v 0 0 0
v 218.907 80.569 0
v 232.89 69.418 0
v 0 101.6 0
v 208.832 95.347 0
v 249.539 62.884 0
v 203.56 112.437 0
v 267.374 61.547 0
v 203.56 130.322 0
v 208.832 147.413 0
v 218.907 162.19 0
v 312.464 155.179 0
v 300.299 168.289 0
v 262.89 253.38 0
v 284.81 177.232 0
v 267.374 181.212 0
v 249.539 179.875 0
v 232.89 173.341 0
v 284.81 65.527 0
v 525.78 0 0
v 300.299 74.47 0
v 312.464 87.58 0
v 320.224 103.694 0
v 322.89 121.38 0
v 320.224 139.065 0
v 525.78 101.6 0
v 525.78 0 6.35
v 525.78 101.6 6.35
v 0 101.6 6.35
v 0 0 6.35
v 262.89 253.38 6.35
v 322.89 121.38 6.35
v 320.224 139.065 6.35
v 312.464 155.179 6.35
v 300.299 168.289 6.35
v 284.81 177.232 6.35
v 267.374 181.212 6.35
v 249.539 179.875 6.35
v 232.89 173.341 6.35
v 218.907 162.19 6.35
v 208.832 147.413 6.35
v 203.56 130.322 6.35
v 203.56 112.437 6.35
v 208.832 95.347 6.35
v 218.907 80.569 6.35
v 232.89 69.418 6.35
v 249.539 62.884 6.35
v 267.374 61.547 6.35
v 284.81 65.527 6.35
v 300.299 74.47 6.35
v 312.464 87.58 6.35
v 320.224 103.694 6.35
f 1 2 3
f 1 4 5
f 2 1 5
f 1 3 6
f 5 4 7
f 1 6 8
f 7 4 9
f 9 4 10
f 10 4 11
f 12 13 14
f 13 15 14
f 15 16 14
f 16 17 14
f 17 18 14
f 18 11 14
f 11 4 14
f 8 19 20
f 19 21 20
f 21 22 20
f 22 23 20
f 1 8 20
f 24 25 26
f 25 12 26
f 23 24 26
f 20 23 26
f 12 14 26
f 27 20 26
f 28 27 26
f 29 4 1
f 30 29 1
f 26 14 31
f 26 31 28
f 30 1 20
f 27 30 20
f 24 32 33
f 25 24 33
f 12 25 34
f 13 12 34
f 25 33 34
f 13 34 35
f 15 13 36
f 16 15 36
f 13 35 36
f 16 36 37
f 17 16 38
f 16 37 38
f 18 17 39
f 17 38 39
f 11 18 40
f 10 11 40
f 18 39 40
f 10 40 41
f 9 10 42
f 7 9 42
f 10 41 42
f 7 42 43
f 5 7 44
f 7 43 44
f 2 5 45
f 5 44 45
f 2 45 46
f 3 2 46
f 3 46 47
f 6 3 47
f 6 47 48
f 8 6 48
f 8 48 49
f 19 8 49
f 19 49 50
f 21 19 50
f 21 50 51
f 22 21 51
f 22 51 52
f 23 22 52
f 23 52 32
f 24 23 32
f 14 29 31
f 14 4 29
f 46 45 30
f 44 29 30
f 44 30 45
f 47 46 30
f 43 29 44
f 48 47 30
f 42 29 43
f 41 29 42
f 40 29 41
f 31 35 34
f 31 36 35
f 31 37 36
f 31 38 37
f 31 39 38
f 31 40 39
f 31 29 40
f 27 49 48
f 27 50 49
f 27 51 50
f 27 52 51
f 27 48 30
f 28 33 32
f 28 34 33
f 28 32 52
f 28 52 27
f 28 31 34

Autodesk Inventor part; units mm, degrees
ref_plane "YZ Plane" through (0, 0, 0) normal (1, 0, 0) x (0, 1, 0)
ref_plane "XZ Plane" through (0, 0, 0) normal (0, 1, 0) x (-1, 0, 0)
ref_plane "XY Plane" through (0, 0, 0) normal (0, 0, 1) x (1, 0, 0)
sketch "Sketch1" plane through (0, 0, 0) normal (0, 0, 1) x (1, 0, 0)
  line L0 (0, 0) -> (525.78, 0)
  line L1 (525.78, 0) -> (525.78, 101.6)
  line L2 (525.78, 101.6) -> (0, 101.6)
  line L3 (0, 101.6) -> (0, 0)
  line L4 (0, 101.6) -> (262.89, 253.3796)
  line L5 (262.89, 253.3796) -> (525.78, 101.6)
  point P0 (262.89, 101.6)
  dimension "d0" = 525.78
  dimension "d1" = 101.6
  dimension "d2" = 30
extrude "Extrusion1" add sketch "Sketch1" along normal blind 6.35
sketch "Sketch7" plane through (0, 0, 6.35) normal (0, 0, 1) x (1, 0, 0)
  circle A0 centre (262.89, 121.3796) radius 60
  point P0 (0, 0)
  point P1 (262.89, 253.3796)
  dimension "d26" = 120
  dimension "d30" = 132
extrude "Extrusion7" cut sketch "Sketch7" against normal through all
properties part number "BA10" material "ABS Plastic"
